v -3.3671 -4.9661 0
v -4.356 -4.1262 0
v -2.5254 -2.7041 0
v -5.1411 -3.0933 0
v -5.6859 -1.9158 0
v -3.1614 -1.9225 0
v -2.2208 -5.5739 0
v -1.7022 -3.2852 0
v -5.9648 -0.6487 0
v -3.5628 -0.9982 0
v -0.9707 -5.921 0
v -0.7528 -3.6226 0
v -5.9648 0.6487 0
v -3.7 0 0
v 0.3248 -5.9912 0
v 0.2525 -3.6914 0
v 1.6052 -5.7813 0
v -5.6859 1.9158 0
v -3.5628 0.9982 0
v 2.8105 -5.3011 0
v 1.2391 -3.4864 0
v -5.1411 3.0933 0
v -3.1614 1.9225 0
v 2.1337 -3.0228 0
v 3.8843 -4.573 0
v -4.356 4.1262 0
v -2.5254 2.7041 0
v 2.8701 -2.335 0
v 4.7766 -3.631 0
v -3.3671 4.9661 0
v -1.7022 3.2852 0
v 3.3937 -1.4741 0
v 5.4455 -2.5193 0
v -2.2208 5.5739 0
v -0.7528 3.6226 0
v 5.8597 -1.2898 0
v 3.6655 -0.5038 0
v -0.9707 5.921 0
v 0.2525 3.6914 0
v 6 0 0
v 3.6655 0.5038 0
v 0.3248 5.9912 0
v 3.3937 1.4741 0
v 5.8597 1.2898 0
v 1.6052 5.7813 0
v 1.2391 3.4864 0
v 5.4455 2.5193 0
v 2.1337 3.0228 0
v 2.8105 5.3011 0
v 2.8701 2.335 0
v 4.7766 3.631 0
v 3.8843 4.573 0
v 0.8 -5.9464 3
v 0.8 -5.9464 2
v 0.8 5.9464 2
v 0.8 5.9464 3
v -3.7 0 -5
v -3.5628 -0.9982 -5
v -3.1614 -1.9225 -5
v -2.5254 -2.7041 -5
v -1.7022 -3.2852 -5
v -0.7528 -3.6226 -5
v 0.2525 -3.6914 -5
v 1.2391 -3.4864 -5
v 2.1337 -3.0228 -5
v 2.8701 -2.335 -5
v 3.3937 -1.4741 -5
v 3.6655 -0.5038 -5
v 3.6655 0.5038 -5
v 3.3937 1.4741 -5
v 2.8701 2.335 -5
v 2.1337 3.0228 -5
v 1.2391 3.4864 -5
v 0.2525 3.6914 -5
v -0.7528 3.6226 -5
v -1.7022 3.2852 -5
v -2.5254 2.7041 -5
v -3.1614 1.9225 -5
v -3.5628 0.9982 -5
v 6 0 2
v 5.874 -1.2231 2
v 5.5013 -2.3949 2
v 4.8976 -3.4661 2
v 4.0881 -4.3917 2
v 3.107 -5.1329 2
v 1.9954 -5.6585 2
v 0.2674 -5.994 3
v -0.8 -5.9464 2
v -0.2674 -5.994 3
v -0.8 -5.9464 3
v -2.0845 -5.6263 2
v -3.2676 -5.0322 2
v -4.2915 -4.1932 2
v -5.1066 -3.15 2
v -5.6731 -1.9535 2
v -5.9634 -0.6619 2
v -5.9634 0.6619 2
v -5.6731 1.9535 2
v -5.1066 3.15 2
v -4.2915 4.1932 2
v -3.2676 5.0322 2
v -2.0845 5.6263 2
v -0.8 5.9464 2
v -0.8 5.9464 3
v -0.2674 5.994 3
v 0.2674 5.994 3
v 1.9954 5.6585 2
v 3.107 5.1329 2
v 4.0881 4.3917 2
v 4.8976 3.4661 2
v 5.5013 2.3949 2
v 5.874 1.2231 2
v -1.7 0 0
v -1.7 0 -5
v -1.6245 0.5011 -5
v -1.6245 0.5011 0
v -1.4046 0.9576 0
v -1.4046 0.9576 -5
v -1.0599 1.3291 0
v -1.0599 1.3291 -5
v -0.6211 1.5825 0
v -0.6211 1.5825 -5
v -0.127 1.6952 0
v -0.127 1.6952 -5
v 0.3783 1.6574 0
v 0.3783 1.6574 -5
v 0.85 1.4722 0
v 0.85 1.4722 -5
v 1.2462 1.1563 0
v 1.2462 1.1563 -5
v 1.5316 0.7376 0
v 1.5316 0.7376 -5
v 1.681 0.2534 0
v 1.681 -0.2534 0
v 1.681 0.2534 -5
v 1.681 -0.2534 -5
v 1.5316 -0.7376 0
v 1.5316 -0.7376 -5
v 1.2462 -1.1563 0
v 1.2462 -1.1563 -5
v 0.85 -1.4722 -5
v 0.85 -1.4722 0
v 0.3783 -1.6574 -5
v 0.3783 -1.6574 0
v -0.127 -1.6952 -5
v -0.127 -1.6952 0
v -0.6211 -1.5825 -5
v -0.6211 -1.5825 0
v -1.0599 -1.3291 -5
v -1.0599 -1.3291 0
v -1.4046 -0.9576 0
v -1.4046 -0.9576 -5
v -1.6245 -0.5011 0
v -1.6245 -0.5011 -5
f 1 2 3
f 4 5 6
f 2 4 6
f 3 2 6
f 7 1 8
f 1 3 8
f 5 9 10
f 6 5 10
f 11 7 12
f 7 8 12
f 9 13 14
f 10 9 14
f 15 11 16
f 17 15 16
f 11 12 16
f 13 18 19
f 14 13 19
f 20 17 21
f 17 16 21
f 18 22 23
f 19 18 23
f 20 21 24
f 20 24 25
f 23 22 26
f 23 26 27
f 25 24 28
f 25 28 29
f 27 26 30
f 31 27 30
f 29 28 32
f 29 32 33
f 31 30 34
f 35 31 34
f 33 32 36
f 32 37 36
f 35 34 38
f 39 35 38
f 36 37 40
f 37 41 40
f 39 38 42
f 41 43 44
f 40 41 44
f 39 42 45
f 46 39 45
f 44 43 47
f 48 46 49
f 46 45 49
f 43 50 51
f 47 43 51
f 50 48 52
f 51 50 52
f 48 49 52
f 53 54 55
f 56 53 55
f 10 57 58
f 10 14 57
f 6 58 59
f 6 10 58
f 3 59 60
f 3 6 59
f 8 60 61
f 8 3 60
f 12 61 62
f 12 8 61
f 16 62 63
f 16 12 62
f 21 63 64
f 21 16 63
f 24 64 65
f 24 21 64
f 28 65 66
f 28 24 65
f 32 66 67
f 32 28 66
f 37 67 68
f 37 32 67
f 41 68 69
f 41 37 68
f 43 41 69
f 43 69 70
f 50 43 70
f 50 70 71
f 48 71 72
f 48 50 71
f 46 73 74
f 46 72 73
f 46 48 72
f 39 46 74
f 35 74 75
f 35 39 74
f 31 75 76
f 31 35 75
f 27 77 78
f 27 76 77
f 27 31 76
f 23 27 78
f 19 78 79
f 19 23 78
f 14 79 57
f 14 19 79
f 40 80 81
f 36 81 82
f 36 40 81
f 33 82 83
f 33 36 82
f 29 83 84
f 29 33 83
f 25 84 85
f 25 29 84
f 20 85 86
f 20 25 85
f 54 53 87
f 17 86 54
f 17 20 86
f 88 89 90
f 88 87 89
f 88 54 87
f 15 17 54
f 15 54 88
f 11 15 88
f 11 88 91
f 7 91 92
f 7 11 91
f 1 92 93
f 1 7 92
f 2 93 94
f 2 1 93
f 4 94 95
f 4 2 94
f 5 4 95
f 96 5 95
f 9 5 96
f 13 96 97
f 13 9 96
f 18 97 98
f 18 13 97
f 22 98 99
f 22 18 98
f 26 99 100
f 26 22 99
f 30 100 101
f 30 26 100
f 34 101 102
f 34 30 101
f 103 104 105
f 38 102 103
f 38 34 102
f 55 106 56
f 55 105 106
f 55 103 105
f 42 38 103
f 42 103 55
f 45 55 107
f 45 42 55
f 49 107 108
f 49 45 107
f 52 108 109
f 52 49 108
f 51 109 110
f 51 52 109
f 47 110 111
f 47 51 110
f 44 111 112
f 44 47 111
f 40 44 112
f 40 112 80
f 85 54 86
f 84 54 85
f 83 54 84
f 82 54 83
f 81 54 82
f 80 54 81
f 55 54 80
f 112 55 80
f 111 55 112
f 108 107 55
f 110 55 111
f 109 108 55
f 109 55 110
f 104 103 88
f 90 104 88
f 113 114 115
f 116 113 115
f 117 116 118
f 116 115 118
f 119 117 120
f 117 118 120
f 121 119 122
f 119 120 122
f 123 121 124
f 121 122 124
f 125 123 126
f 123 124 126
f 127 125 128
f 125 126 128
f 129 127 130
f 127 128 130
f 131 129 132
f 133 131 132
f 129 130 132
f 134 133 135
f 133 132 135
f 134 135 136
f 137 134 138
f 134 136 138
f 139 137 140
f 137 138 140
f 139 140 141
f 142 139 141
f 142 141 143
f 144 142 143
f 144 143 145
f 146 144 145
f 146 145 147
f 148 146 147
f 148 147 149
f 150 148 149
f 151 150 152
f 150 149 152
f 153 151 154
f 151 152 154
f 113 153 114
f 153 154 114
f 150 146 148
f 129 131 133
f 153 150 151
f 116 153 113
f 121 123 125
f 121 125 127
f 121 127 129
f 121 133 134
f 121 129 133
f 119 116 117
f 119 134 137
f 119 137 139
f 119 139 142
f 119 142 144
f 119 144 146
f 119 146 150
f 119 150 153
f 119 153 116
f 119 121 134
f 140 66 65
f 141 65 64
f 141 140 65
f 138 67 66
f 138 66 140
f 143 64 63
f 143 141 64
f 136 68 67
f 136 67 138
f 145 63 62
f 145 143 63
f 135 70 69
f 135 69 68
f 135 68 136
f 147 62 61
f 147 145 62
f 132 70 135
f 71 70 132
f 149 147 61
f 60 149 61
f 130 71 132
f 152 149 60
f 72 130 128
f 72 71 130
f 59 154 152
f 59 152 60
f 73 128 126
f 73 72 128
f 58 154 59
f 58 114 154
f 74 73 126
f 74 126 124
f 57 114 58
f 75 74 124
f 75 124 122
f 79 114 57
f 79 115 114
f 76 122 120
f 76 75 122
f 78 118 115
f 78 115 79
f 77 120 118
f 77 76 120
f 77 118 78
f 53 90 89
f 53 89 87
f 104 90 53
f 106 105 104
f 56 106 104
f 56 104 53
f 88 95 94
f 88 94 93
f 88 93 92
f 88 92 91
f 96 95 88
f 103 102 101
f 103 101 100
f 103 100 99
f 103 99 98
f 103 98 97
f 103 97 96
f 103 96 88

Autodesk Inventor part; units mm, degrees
ref_plane "YZ Plane" through (0, 0, 0) normal (1, 0, 0) x (0, 1, 0)
ref_plane "XZ Plane" through (0, 0, 0) normal (0, 1, 0) x (-1, 0, 0)
ref_plane "XY Plane" through (0, 0, 0) normal (0, 0, 1) x (1, 0, 0)
sketch "Sketch1" plane through (0, 0, 0) normal (0, 0, 1) x (1, 0, 0)
  circle A0 centre (0, 0) radius 6
  dimension "d0" = 12
extrude "Extrusion1" add sketch "Sketch1" along normal blind 2
sketch "Sketch2" plane through (0, 0, 2) normal (0, 0, 1) x (1, 0, 0)
  line L0 (-0.8, -7.5) -> (0.8, -7.5)
  line L1 (0.8, -7.5) -> (0.8, 7.5)
  line L2 (0.8, 7.5) -> (-0.8, 7.5)
  line L3 (-0.8, 7.5) -> (-0.8, -7.5)
  line L4 (-0.8, -7.5) -> (0.8, 7.5) construction
  line L5 (0.8, -7.5) -> (-0.8, 7.5) construction
  circle A0 centre (0, 0) radius 6 projected
  line L6 (-6, 0) -> (6, 0) construction
  point P0 (0.8, 5.9464)
  point P1 (-0.8, 5.9464)
  point P2 (-0.8, -5.9464)
  point P3 (0.8, -5.9464)
  dimension "d5" = 1.6
  dimension "d6" = 15
extrude "Extrusion2" add sketch "Sketch2" along normal blind 1 contours L3 A0 L1
sketch "Sketch3" plane through (0, 0, 0) normal (0, 0, -1) x (-1, 0, 0)
  circle A0 centre (0, 0) radius 3.7
  dimension "d9" = 7.4
extrude "Extrusion3" add sketch "Sketch3" along normal blind 5
sketch "Sketch4" plane through (0, 0, -5) normal (0, 0, -1) x (-1, 0, 0)
  circle A0 centre (0, 0) radius 1.7
  dimension "d12" = 3.4
extrude "Extrusion4" cut sketch "Sketch4" against normal blind 5
properties part number "PrzegubGorny"
